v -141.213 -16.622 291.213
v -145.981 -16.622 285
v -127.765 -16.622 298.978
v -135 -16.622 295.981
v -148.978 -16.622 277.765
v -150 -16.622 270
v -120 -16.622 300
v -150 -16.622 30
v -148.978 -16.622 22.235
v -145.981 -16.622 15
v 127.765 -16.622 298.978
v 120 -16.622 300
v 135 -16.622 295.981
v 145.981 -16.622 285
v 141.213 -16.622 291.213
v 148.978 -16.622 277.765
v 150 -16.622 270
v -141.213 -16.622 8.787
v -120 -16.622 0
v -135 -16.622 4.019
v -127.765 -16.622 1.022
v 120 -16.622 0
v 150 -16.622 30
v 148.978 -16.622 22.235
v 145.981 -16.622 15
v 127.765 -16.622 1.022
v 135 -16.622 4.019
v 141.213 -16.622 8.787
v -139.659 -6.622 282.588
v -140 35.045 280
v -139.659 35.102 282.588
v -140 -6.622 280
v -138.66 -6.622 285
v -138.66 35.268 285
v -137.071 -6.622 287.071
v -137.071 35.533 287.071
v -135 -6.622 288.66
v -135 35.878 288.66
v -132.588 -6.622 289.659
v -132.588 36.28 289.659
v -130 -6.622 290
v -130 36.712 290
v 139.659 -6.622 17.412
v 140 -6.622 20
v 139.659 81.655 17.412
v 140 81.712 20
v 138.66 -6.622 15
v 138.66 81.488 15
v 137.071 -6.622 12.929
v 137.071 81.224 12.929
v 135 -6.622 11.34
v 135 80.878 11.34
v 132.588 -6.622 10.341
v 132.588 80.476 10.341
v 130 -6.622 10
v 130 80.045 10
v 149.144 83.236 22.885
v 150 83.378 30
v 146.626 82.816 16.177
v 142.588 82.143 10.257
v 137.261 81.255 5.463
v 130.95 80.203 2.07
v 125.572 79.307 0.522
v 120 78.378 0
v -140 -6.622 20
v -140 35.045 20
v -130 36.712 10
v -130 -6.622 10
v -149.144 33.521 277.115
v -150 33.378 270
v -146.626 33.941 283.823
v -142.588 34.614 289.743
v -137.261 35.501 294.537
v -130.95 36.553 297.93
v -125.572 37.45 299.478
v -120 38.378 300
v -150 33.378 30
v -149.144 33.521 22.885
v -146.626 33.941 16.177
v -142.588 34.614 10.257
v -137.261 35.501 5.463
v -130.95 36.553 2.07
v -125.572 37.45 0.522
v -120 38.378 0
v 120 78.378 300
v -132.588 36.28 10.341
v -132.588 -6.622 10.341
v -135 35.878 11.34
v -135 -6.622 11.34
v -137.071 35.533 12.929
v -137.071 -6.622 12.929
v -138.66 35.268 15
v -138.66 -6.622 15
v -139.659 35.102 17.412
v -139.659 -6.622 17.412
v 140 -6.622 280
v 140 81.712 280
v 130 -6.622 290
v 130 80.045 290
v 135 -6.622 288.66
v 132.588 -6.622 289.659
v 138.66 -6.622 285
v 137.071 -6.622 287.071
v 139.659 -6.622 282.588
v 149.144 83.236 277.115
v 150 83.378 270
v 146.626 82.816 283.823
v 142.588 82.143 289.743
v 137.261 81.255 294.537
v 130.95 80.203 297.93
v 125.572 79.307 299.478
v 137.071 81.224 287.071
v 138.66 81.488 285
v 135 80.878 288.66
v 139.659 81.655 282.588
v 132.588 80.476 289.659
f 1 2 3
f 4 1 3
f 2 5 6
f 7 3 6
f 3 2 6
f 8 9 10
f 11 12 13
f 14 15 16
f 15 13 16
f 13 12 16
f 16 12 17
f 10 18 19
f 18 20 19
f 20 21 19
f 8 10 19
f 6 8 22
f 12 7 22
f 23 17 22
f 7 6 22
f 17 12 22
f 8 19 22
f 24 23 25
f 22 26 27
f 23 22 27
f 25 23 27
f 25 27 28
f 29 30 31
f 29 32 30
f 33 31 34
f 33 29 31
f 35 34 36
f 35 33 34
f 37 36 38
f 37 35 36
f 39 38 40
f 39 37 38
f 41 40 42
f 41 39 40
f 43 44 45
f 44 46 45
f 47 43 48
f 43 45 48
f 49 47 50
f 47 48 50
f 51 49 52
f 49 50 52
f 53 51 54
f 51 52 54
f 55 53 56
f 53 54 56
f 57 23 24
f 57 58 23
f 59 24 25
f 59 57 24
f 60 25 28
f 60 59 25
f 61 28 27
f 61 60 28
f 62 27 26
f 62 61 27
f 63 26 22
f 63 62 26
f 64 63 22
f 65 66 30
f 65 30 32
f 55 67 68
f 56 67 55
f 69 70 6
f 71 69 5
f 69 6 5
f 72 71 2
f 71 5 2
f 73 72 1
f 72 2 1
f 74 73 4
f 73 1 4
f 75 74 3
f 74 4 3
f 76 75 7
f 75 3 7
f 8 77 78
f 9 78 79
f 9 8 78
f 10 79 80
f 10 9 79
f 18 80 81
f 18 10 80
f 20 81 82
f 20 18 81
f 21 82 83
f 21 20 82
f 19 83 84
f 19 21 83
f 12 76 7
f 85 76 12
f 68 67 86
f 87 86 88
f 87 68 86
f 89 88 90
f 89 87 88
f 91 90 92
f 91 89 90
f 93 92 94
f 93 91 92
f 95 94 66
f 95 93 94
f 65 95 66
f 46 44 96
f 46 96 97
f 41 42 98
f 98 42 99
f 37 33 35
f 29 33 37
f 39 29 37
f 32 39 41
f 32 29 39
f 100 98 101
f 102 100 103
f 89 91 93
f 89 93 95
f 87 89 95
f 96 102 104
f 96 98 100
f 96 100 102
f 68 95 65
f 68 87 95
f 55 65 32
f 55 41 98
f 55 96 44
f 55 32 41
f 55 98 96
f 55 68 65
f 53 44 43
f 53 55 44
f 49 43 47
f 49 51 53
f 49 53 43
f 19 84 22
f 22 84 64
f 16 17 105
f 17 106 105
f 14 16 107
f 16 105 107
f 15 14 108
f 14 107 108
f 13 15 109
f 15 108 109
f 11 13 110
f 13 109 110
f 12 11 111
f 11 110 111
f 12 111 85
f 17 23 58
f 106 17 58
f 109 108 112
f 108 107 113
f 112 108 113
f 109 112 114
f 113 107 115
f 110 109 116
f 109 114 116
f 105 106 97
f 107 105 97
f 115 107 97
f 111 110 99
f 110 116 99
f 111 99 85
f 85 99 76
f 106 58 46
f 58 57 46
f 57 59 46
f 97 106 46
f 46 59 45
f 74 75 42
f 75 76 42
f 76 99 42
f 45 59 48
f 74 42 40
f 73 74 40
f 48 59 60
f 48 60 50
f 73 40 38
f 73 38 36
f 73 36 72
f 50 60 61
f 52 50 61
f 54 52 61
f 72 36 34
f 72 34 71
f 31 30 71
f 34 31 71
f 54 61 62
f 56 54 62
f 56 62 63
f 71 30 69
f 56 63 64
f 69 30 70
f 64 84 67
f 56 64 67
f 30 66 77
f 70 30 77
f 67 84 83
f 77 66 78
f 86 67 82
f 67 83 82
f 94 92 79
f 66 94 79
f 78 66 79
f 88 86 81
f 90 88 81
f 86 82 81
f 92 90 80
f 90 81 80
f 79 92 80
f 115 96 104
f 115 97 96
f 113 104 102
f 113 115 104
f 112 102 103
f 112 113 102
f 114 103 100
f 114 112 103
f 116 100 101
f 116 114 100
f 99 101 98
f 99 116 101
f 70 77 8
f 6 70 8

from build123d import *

# Parameters (mm, degrees)
BOSS_EXTRUDE1_DEPTH = 300
SHELL1_T            = -10
FILLET1_R           = 30
FILLET2_R           = 10


with BuildPart() as part:
    # Sketch1 → Boss-Extrude1 (new body)
    with BuildSketch(Plane.XY):
        Polygon((-150, -16.621621622), (150, -16.621621622), (150, 83.378378378), (-150, 33.378378378), align=None)
    extrude(amount=BOSS_EXTRUDE1_DEPTH)

    # Shell1
    shell1_openings = [part.faces().sort_by_distance(p)[0] for p in [
        (0, 58.378378378, 150),
    ]]
    offset(amount=SHELL1_T, openings=shell1_openings, kind=Kind.INTERSECTION)

    # Fillet1
    fillet1_edges = [part.edges().sort_by_distance(p)[0] for p in [
        (150, 33.378378378, 300),
        (-150, 8.378378378, 300),
        (150, 33.378378378, 0),
        (-150, 8.378378378, 0),
    ]]
    fillet(fillet1_edges, radius=FILLET1_R)

    # Fillet2
    fillet2_edges = [part.edges().sort_by_distance(p)[0] for p in [
        (-140, 14.211711712, 10),
        (140, 37.545045045, 10),
        (-140, 14.211711712, 290),
        (140, 37.545045045, 290),
    ]]
    fillet(fillet2_edges, radius=FILLET2_R)


solid = part.part
